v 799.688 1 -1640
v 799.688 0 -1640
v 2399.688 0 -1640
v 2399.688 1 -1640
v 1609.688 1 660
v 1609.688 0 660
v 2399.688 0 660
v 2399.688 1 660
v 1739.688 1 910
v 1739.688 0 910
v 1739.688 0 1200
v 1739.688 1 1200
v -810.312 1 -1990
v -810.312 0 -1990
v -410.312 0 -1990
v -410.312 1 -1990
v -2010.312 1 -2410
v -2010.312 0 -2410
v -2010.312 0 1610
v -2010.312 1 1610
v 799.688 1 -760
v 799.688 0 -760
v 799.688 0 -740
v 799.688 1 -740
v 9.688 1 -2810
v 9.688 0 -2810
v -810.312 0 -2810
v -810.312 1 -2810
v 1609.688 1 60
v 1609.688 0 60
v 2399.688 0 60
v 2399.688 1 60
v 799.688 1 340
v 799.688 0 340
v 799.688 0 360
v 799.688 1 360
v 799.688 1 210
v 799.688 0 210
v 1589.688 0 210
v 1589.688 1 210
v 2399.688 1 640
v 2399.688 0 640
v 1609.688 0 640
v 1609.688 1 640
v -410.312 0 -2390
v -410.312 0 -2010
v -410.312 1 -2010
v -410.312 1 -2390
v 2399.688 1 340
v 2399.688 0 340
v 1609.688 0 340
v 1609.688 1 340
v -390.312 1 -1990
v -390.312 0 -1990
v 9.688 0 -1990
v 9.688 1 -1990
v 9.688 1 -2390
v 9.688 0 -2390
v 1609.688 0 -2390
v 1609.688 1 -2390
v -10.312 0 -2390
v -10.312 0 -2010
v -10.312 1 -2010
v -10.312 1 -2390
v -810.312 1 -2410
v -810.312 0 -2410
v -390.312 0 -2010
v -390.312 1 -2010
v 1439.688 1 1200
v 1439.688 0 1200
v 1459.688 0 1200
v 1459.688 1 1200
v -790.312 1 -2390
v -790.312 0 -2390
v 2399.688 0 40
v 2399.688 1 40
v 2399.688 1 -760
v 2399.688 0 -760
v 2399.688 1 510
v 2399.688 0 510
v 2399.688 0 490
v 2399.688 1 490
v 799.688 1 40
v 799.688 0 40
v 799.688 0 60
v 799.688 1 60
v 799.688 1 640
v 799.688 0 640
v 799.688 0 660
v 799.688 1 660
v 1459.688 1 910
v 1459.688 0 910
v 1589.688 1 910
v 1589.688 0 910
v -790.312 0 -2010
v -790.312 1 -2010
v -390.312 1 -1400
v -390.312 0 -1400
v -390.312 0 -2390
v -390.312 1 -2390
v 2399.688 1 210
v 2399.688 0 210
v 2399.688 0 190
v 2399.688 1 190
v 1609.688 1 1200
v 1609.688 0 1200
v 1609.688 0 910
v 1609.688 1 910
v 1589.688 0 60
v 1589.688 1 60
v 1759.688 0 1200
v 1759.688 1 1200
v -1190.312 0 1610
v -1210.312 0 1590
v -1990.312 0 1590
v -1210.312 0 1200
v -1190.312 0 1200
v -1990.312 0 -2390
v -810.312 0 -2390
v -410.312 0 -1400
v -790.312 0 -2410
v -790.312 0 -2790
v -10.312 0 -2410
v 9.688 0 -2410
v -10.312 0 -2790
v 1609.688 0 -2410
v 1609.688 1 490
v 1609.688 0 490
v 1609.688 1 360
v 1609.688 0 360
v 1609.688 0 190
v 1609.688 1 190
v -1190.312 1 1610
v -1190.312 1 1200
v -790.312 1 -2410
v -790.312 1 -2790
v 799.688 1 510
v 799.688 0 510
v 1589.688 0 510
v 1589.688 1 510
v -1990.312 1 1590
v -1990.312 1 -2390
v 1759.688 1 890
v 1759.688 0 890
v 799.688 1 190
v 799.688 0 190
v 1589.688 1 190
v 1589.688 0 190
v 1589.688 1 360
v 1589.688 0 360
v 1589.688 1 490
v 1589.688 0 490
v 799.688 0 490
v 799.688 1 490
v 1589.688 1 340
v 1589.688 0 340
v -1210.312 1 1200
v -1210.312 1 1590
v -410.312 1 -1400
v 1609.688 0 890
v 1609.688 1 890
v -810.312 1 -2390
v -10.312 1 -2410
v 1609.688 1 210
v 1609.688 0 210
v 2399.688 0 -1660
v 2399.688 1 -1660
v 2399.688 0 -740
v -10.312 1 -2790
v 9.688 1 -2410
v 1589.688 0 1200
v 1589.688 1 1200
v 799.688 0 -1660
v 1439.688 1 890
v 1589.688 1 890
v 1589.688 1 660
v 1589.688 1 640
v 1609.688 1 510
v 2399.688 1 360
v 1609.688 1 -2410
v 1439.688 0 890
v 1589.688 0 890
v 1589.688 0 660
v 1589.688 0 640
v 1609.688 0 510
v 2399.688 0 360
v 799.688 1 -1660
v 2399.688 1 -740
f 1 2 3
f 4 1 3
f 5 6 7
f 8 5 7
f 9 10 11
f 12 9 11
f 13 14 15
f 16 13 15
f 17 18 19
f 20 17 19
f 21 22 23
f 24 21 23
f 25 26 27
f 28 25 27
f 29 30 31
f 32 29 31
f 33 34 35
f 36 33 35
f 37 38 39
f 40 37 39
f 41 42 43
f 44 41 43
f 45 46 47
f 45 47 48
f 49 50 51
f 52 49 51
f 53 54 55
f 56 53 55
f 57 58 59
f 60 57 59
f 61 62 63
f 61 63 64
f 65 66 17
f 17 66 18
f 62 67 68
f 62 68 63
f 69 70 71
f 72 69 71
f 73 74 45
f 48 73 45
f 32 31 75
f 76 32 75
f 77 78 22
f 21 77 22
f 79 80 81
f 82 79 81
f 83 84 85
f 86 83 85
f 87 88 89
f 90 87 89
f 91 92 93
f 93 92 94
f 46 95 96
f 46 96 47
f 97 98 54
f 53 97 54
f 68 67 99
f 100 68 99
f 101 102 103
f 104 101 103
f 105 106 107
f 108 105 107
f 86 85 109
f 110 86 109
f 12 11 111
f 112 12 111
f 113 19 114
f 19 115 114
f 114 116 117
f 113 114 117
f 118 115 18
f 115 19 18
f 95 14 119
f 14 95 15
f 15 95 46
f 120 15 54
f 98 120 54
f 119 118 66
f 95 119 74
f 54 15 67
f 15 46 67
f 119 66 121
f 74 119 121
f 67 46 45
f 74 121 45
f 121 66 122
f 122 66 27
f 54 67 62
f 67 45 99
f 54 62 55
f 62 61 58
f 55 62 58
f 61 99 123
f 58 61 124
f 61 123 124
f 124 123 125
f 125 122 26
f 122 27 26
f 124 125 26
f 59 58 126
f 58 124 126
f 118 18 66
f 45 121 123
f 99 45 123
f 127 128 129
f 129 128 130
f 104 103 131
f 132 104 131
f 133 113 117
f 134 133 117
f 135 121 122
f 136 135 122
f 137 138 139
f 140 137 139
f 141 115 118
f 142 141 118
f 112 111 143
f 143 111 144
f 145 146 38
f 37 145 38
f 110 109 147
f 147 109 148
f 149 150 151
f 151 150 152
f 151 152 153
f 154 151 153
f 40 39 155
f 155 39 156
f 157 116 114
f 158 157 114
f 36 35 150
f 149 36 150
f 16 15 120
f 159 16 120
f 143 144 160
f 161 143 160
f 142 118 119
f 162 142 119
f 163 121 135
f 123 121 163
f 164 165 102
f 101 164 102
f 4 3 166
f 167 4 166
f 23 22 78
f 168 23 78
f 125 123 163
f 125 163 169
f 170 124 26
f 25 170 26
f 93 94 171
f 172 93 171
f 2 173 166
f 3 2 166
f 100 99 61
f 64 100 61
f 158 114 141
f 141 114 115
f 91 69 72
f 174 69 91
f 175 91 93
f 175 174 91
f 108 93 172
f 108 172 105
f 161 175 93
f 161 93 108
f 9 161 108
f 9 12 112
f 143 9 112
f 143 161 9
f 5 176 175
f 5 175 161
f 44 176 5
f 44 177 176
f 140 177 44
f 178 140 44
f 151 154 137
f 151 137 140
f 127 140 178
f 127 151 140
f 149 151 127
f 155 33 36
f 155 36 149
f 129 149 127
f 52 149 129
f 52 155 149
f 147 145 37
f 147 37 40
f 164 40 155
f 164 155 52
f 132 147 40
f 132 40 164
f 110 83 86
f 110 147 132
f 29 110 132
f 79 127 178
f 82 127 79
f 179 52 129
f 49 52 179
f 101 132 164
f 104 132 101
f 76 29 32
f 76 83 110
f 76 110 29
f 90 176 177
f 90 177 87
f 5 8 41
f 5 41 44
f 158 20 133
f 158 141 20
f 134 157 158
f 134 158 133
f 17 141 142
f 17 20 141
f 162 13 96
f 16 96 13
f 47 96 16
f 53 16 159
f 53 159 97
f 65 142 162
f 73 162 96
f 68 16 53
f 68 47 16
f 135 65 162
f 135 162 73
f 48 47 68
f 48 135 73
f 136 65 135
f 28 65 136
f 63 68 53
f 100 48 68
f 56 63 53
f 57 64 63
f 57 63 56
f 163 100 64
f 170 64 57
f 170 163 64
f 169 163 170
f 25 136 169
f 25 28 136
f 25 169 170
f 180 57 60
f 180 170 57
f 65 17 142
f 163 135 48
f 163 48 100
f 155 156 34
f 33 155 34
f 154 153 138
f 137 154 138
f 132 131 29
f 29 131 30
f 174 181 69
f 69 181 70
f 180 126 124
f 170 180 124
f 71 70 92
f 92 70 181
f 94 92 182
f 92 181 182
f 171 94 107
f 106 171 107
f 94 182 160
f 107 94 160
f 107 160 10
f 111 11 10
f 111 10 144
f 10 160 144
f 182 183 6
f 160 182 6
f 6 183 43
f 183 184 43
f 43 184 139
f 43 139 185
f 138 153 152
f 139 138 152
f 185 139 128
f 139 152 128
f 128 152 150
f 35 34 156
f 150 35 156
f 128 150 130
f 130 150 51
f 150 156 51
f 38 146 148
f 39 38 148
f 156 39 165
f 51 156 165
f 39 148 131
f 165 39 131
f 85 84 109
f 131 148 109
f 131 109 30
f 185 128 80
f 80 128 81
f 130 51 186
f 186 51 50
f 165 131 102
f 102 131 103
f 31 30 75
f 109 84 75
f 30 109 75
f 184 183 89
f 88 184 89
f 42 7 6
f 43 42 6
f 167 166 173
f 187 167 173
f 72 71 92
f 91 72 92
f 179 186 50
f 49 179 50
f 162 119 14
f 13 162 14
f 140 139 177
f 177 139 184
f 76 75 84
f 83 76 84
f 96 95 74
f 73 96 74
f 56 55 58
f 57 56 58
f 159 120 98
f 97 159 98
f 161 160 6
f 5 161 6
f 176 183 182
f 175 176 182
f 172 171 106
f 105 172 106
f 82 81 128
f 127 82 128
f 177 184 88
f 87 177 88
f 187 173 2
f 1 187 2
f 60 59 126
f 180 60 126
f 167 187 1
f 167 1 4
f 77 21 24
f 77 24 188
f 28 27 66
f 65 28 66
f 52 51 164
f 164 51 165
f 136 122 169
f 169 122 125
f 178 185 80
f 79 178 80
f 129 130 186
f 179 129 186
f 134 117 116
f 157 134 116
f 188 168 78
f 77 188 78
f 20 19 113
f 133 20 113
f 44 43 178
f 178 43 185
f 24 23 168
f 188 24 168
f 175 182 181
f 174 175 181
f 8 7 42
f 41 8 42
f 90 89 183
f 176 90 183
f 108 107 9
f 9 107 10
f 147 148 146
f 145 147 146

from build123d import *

# Parameters (mm, degrees)
SKETCH_2_W               = 780
SKETCH_2_H               = 380
SKETCH_2_W_2             = 380
EXTRUDE_1_DEPTH          = 1
CUT_EXTRUDE_2_DEPTH      = 3696.213364201
CUT_EXTRUDE_2_DEPTH_BACK = 3696.213364201
SKETCH_3_W               = 20
SKETCH_3_H               = 880
SKETCH_3_H_2             = 730
SKETCH_3_H_3             = 780


with BuildPart() as part:
    # 草图2 → 凸台-拉伸1 (new body)
    with BuildSketch(Plane(origin=(0, 0, 0), x_dir=(1, 0, 0), z_dir=(0, 1, 0))):
        Polygon((-2010.312352208, -1610), (-1190.312352208, -1610), (-1190.312352208, -1600), (-1190.312352208, -1200), (-1210.312352208, -1200), (-1210.312352208, -1590), (-1990.312352208, -1590), (-1990.312352208, 2390), (-810.312352208, 2390), (-810.312352208, 1990), (-410.312352208, 1990), (-410.312352208, 1400), (-390.312352208, 1400), (-390.312352208, 1990), (9.687647792, 1990), (9.687647792, 2390), (799.687647792, 2390), (1589.687647792, 2390), (1589.687647792, 1660), (799.687647792, 1660), (799.687647792, 1640), (1589.687647792, 1640), (1589.687647792, 760), (799.687647792, 760), (799.687647792, 740), (1589.687647792, 740), (1589.687647792, -40), (799.687647792, -40), (799.687647792, -60), (1589.687647792, -60), (1589.687647792, -190), (799.687647792, -190), (799.687647792, -210), (1589.687647792, -210), (1589.687647792, -340), (799.687647792, -340), (799.687647792, -360), (1589.687647792, -360), (1589.687647792, -490), (799.687647792, -490), (799.687647792, -510), (1589.687647792, -510), (1589.687647792, -640), (799.687647792, -640), (799.687647792, -660), (1589.687647792, -660), (1589.687647792, -890), (1439.687647792, -890), (1439.687647792, -1200), (1459.687647792, -1200), (1459.687647792, -910), (1589.687647792, -910), (1589.687647792, -1200), (1609.687647792, -1200), (1609.687647792, -910), (1739.687647792, -910), (1739.687647792, -1200), (1759.687647792, -1200), (1759.687647792, -890), (1609.687647792, -890), (1609.687647792, -660), (2399.687647792, -660), (2399.687647792, -640), (1609.687647792, -640), (1609.687647792, -510), (2399.687647792, -510), (2399.687647792, -490), (1609.687647792, -490), (1609.687647792, -360), (2399.687647792, -360), (2399.687647792, -340), (1609.687647792, -340), (1609.687647792, -210), (2399.687647792, -210), (2399.687647792, -190), (1609.687647792, -190), (1609.687647792, -60), (2399.687647792, -60), (2399.687647792, -40), (1609.687647792, -40), (1609.687647792, 740), (2399.687647792, 740), (2399.687647792, 760), (1609.687647792, 760), (1609.687647792, 1640), (2399.687647792, 1640), (2399.687647792, 1660), (1609.687647792, 1660), (1609.687647792, 2410), (799.687647792, 2410), (9.687647792, 2410), (9.687647792, 2810), (-810.312352208, 2810), (-810.312352208, 2410), (-2010.312352208, 2410), (-2010.312352208, -1600), align=None)
        with Locations((-400.312352208, 2600)):
            Rectangle(SKETCH_2_W, SKETCH_2_H, mode=Mode.SUBTRACT)
        with Locations((-200.312352208, 2200)):
            Rectangle(SKETCH_2_W_2, SKETCH_2_H, mode=Mode.SUBTRACT)
        with Locations((-600.312352208, 2200)):
            Rectangle(SKETCH_2_W_2, SKETCH_2_H, mode=Mode.SUBTRACT)
    extrude(amount=EXTRUDE_1_DEPTH)

    # 草图3 → 切除-拉伸2 (cut, two sides: drawn at the far end of the back side and taken through both)
    with BuildSketch(Plane(origin=(0, 0, 0), x_dir=(1, 0, 0), z_dir=(0, 1, 0)).offset(-CUT_EXTRUDE_2_DEPTH_BACK)):
        with Locations((1599.687647792, 1200)):
            Rectangle(SKETCH_3_W, SKETCH_3_H)
        with Locations((1599.687647792, 2025)):
            Rectangle(SKETCH_3_W, SKETCH_3_H_2)
        with Locations((1599.687647792, 350)):
            Rectangle(SKETCH_3_W, SKETCH_3_H_3)
    extrude(amount=CUT_EXTRUDE_2_DEPTH + CUT_EXTRUDE_2_DEPTH_BACK, mode=Mode.SUBTRACT)


with BuildPart() as cut_extrude_2_piece_1:
    # of the separate pieces the step leaves, piece 1, a body of its own (cut_extrude_2_pieces)
    add(part.part.solids().sort_by_distance((-2010.312352208, 0, 1610))[0])


with BuildPart() as cut_extrude_2_piece_2:
    # of the separate pieces the step leaves, piece 2, a body of its own (cut_extrude_2_pieces)
    add(part.part.solids().sort_by_distance((2399.687647792, 0, 60))[0])


with BuildPart() as cut_extrude_2_piece_3:
    # of the separate pieces the step leaves, piece 3, a body of its own (cut_extrude_2_pieces)
    add(part.part.solids().sort_by_distance((2399.687647792, 0, -740))[0])


with BuildPart() as cut_extrude_2_piece_4:
    # of the separate pieces the step leaves, piece 4, a body of its own (cut_extrude_2_pieces)
    add(part.part.solids().sort_by_distance((2399.687647792, 0, -1640))[0])


solid = Compound([cut_extrude_2_piece_1.part, cut_extrude_2_piece_2.part, cut_extrude_2_piece_3.part, cut_extrude_2_piece_4.part])
